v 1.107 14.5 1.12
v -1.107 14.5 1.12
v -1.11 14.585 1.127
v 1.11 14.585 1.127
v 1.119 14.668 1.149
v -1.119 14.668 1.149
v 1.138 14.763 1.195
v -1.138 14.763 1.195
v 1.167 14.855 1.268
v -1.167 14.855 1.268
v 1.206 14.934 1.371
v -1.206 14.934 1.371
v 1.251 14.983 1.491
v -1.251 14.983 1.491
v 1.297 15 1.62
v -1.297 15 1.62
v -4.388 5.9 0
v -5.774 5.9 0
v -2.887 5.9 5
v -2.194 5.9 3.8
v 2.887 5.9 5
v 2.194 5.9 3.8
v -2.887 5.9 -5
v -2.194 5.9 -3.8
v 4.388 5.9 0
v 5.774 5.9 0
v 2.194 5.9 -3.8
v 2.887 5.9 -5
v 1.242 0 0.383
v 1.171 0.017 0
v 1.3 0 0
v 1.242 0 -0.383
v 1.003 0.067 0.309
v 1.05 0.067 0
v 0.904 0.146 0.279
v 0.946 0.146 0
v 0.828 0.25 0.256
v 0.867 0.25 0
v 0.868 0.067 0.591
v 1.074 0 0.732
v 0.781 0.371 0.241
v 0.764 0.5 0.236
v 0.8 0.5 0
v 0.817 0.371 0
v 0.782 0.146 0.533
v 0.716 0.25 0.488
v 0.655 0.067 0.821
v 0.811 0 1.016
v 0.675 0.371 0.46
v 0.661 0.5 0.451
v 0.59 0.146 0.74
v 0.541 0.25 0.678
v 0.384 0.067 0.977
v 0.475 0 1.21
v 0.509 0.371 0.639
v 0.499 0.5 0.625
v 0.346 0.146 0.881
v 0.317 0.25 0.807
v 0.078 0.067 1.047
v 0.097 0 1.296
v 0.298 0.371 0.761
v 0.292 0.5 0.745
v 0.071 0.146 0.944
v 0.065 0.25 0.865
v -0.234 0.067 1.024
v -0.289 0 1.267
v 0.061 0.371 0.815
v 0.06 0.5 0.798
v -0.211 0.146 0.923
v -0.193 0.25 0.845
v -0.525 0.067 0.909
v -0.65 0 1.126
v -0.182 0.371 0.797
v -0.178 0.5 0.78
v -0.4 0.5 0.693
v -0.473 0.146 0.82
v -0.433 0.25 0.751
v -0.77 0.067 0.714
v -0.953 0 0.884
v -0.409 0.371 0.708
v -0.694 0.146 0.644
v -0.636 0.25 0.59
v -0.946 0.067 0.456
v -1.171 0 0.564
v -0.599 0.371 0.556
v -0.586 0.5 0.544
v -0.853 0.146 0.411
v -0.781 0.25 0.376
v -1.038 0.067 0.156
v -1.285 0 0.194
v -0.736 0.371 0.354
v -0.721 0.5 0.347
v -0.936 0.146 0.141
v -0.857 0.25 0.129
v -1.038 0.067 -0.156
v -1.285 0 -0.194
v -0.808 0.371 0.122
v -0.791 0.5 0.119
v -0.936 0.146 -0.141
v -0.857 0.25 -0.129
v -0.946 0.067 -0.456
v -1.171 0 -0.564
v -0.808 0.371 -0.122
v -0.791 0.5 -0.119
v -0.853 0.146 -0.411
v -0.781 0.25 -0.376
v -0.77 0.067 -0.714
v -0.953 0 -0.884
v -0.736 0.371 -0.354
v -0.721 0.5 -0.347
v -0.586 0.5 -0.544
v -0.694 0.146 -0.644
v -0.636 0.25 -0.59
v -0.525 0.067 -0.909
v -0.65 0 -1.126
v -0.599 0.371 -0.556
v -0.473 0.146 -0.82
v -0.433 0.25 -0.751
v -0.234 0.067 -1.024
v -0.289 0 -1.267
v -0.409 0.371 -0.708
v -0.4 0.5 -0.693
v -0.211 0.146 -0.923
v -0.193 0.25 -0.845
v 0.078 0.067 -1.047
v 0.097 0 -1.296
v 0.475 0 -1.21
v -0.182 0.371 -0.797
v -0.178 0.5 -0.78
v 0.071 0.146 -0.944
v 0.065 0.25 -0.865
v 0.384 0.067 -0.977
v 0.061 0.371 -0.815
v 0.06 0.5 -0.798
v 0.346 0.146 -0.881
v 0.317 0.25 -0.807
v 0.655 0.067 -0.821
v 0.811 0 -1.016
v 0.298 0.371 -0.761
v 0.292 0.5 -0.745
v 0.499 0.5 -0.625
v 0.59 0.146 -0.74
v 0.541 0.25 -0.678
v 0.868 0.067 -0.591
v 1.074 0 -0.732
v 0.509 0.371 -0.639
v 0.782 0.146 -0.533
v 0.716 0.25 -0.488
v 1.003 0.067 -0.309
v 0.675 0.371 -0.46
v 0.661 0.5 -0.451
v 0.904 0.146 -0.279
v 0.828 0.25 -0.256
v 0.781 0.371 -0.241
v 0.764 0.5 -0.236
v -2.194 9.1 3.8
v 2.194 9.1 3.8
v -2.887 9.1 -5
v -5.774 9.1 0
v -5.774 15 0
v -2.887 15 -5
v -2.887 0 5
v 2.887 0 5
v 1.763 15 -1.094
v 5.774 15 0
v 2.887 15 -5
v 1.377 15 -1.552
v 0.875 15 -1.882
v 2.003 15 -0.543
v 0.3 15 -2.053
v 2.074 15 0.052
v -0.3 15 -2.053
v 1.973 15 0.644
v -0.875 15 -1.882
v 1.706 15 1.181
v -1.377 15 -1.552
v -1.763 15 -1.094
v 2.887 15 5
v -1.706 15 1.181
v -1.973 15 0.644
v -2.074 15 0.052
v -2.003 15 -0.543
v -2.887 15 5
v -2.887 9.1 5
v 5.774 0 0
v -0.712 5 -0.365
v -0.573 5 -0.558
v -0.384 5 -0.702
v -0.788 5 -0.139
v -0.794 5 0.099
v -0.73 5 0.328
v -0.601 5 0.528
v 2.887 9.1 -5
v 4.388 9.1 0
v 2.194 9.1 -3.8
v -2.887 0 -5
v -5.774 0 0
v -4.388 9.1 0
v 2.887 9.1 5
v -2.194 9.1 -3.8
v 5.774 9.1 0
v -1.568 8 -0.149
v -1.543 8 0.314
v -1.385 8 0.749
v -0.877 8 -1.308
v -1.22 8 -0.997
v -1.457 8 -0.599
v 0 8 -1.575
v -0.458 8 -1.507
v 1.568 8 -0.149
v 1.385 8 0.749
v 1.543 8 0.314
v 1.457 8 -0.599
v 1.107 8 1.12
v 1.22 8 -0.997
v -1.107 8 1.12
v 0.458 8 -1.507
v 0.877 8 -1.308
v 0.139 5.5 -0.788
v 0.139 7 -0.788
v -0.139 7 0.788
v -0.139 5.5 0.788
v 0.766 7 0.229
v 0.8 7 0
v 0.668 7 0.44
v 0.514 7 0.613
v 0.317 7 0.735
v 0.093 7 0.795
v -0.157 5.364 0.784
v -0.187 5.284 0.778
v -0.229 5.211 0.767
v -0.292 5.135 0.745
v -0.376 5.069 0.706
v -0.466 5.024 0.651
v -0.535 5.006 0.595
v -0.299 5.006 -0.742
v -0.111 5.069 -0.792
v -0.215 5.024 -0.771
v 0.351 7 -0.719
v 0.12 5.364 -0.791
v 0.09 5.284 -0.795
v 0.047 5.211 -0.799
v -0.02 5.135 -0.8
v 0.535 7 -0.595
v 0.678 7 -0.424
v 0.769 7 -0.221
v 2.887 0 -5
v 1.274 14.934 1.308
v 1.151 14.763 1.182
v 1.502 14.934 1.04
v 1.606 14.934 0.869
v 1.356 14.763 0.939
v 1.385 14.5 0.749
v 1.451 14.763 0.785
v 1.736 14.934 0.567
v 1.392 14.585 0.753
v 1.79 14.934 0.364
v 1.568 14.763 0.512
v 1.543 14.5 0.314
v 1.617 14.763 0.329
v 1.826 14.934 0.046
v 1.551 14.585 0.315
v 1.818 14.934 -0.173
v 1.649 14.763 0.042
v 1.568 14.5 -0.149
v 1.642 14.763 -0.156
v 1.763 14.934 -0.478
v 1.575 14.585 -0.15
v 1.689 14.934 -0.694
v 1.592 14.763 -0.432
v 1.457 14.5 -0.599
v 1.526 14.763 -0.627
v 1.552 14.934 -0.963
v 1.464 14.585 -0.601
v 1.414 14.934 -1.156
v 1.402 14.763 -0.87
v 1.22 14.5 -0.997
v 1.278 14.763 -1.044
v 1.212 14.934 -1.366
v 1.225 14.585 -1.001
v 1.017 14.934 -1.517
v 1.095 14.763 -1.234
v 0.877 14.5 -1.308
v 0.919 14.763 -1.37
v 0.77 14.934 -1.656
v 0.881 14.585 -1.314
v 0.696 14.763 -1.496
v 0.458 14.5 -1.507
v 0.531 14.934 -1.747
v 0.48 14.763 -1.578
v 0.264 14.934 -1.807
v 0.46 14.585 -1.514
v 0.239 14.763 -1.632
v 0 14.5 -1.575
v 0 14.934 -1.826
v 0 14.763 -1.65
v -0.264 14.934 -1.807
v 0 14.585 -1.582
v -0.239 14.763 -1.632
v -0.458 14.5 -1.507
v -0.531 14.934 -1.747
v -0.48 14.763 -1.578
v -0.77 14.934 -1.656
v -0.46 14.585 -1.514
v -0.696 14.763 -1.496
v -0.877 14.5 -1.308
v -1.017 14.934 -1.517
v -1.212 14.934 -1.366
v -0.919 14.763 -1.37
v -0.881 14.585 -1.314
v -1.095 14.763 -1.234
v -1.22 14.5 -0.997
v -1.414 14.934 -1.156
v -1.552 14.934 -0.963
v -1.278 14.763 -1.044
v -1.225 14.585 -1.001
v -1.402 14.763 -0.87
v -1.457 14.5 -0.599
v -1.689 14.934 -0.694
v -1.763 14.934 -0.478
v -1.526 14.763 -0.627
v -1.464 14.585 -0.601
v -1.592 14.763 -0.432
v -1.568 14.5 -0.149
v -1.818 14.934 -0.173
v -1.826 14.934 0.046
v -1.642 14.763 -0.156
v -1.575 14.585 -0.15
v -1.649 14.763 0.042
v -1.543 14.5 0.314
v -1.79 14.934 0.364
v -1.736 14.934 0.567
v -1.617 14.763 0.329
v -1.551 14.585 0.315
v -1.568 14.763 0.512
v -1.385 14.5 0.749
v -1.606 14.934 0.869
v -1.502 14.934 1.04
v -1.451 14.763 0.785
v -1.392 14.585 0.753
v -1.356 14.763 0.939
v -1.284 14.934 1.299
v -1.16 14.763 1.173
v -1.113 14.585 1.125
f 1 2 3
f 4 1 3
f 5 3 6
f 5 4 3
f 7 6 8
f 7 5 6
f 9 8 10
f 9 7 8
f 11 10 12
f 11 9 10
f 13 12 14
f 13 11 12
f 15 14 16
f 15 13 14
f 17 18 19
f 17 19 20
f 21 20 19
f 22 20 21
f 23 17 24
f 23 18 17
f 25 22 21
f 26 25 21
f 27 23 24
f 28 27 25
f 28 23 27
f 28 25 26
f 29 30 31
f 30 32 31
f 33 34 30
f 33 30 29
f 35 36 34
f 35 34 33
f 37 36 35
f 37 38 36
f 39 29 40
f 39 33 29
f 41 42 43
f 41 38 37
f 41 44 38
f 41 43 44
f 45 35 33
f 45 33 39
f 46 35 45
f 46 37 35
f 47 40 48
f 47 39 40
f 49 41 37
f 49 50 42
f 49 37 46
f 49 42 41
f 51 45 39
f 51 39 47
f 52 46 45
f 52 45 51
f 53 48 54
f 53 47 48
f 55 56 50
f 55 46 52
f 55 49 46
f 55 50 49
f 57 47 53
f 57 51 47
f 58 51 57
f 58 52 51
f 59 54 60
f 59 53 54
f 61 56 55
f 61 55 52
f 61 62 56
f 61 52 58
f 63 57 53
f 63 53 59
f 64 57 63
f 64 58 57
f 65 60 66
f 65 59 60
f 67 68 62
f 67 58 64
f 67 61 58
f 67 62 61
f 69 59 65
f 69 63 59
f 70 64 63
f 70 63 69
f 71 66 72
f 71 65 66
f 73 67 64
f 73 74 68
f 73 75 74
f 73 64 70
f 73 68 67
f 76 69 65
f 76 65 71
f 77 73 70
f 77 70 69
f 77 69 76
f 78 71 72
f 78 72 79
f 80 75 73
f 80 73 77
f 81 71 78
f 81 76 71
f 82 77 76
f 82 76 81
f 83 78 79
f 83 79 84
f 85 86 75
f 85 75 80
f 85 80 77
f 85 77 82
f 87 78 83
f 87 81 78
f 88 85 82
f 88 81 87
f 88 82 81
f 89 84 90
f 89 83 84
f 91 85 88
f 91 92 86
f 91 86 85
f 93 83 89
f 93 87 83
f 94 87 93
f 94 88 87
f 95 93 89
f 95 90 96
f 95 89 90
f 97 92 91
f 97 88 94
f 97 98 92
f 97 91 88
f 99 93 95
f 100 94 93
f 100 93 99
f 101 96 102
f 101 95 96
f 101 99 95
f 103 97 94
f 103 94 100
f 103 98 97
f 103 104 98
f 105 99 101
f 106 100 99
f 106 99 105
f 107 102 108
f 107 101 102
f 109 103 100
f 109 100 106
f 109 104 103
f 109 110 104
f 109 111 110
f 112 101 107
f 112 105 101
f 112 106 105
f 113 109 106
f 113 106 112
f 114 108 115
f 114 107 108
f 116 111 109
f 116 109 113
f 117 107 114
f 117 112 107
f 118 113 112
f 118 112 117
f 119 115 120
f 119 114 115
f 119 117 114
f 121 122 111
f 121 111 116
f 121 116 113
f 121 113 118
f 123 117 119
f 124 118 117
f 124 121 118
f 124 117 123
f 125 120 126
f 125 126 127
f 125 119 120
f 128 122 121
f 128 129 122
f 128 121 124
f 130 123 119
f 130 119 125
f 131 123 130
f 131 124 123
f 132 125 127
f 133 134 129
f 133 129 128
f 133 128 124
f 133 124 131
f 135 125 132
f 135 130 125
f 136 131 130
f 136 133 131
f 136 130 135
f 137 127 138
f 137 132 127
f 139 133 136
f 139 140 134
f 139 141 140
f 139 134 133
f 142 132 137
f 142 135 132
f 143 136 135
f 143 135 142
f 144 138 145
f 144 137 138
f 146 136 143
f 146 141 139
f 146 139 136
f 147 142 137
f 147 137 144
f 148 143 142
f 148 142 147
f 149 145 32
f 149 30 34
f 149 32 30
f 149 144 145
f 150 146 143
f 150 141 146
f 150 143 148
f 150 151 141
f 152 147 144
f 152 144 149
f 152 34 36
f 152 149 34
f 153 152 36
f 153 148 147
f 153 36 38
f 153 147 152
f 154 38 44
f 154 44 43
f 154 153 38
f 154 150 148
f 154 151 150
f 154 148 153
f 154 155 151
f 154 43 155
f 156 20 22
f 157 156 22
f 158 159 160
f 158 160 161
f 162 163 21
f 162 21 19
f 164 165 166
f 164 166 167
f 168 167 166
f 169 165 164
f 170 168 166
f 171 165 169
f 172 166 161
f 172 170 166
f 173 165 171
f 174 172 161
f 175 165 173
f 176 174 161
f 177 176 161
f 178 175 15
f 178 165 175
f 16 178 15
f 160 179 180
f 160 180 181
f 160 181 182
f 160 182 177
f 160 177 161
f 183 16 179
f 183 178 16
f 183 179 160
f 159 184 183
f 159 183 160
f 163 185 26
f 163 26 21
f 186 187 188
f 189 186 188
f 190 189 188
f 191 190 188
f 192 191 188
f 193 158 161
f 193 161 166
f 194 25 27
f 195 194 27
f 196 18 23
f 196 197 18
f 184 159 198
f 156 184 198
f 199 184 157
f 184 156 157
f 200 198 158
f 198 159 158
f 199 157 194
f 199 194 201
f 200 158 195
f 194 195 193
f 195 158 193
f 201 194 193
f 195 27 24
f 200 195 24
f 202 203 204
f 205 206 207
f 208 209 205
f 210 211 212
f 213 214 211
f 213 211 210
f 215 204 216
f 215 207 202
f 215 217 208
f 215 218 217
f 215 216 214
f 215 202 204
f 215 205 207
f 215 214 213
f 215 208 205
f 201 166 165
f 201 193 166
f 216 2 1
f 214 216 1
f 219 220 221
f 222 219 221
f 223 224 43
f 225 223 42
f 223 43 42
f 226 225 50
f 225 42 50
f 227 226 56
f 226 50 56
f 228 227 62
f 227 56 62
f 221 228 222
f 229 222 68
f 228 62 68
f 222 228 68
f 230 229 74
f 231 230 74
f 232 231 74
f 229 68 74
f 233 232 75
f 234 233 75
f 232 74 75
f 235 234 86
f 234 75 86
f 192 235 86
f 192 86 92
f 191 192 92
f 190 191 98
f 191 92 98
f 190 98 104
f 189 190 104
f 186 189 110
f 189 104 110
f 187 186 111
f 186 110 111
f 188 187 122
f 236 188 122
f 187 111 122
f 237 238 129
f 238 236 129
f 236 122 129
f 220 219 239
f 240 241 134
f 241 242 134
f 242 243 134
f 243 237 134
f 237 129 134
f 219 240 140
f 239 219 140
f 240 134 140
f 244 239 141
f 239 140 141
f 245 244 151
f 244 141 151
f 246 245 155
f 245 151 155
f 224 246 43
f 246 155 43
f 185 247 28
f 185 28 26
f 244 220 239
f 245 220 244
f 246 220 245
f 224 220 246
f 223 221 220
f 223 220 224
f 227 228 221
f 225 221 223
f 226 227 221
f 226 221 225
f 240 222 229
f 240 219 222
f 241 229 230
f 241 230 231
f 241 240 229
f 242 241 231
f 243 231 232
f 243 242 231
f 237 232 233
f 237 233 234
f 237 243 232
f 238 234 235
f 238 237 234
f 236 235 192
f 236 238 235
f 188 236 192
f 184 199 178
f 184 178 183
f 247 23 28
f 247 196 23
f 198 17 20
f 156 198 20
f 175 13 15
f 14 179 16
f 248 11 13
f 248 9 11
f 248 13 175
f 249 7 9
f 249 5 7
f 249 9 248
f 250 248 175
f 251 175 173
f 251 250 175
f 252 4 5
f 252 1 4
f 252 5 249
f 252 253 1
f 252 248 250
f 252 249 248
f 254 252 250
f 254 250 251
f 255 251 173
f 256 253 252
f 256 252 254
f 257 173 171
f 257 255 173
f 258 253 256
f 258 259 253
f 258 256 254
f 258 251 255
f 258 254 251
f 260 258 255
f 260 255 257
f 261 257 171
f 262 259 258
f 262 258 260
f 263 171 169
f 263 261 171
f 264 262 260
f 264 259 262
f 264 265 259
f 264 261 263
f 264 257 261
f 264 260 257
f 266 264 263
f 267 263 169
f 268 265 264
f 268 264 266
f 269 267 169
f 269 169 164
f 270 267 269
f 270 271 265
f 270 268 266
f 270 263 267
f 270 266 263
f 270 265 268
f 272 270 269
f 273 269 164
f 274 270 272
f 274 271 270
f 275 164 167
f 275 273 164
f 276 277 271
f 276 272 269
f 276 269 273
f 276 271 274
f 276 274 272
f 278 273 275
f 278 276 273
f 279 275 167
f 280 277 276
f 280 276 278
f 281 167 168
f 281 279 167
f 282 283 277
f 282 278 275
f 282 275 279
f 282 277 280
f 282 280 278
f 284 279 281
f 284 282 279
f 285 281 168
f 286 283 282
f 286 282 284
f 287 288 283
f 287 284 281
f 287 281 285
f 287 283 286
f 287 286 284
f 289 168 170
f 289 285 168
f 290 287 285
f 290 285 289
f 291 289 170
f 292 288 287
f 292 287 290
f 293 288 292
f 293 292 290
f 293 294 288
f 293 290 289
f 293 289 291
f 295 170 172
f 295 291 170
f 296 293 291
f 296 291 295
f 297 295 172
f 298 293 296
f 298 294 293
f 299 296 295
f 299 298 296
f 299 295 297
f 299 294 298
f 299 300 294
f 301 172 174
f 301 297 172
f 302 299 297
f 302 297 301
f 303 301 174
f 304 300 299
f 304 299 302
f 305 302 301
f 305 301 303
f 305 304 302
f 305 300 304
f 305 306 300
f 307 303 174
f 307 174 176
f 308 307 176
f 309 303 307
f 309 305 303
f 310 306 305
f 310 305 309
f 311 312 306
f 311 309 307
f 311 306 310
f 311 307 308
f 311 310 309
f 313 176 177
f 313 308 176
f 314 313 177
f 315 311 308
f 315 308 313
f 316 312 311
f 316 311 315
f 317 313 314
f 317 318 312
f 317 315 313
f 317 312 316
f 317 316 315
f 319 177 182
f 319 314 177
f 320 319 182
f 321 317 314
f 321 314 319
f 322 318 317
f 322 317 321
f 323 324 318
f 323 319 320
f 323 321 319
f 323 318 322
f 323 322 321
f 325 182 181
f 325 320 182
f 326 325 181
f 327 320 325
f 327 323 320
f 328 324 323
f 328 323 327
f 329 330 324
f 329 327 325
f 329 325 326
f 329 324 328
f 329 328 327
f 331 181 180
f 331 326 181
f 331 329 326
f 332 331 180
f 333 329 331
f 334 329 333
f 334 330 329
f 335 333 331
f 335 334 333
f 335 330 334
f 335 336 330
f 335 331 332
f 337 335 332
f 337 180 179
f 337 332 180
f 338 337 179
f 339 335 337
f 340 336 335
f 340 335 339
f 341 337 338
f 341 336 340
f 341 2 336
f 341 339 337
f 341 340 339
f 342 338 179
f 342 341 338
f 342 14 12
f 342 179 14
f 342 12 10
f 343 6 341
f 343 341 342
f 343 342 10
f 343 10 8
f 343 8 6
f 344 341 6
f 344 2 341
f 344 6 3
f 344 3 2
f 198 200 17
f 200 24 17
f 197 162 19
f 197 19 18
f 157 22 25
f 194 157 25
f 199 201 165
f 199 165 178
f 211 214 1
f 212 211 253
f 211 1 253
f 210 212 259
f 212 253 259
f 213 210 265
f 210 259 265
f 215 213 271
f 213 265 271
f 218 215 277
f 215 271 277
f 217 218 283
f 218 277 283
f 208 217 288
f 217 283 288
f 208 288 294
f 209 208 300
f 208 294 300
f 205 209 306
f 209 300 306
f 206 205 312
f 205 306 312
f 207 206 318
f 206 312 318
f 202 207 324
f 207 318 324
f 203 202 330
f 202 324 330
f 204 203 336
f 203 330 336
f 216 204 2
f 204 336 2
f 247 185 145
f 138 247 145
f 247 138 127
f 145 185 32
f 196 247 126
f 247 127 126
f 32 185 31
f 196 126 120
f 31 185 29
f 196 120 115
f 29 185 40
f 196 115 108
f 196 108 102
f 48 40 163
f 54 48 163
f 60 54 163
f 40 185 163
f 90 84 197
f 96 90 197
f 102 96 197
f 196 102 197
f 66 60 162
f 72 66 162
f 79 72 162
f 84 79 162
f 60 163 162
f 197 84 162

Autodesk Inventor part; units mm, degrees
ref_plane "YZ Plane" through (0, 0, 0) normal (1, 0, 0) x (0, 1, 0)
ref_plane "XZ Plane" through (0, 0, 0) normal (0, 1, 0) x (-1, 0, 0)
sketch "Boceto1" plane through (0, 0, 0) normal (0, 1, 0) x (-1, 0, 0)
  line L0 (5.7735, 0) -> (2.8868, -5)
  line L1 (2.8868, -5) -> (-2.8868, -5)
  line L2 (-2.8868, -5) -> (-5.7735, 0)
  line L3 (-5.7735, 0) -> (-2.8868, 5)
  line L4 (-2.8868, 5) -> (2.8868, 5)
  line L5 (2.8868, 5) -> (5.7735, 0)
  circle A0 centre (0, 0) radius 5
  dimension "d0" = 10
extrude "Extrusión1" add sketch "Boceto1" along normal blind 15
sketch "Boceto2" plane through (0, 15, 0) normal (0, 1, 0) x (1, 0, 0)
  circle A0 centre (0, 0) radius 1.575
  line L0 (-1.1074, -1.12) -> (1.1074, -1.12)
  dimension "d3" = 3.15
  dimension "d6" = 1.12
extrude "Extrusión2" cut sketch "Boceto2" against normal blind 7 contours A0 L0 picked at (0.4242, -0.1216)
sketch "Boceto3" plane through (0, 0, 0) normal (0, -1, 0) x (1, 0, 0)
  circle A0 centre (0, 0) radius 0.8
  dimension "d7" = 1.6
extrude "Extrusión3" cut sketch "Boceto3" against normal blind 7
sketch "Boceto4" plane through (0, 7, 0) normal (0, -1, 0) x (1, 0, 0)
  circle A0 centre (0, 0) radius 0.8 projected
  line L0 (0.1389, -0.7878) -> (-0.1389, 0.7878)
  circle A1 centre (0, 0) radius 0.8 projected
  line L1 (0.8, 0) -> (-0.8, 0)
  line L2 (-0.0393, 0.799) -> (0.2363, -0.7643)
  line L3 (0.0894, -0.795) -> (-0.1879, 0.7776)
  point P0 (0.0894, -0.795)
  point P1 (-0.1879, 0.7776)
  dimension "d16" = 80
  dimension "d17" = 0.1
  dimension "d18" = 0.05
extrude "Extrusión4" add sketch "Boceto4" along normal blind 2 contours L0 L1 L3 A0 | A0 L3 L1 L0 | L3 L1 A0 | A0 L1 L3
ref_plane "Plano de trabajo1" through (0, 7.5, 0) normal (0, 1, 0) x (1, 0, 0)
sketch "Boceto5" plane through (0, 7.5, 0) normal (0, 1, 0) x (1, 0, 0)
  circle A0 centre (0, 0) radius 0.8 projected
  line L0 (5.7735, 0) -> (2.8868, 5) projected
  line L1 (2.8868, -5) -> (5.7735, 0) projected
  line L2 (-2.8868, -5) -> (2.8868, -5) projected
  line L3 (-5.7735, 0) -> (-2.8868, -5) projected
  line L4 (-2.8868, 5) -> (-5.7735, 0) projected
  line L5 (2.8868, 5) -> (-2.8868, 5) projected
  line L6 (-4.3879, 0) -> (-2.1939, -3.8)
  line L7 (-2.1939, -3.8) -> (2.1939, -3.8)
  line L8 (2.1939, -3.8) -> (4.3879, 0)
  line L9 (4.3879, 0) -> (2.1939, 3.8)
  line L10 (2.1939, 3.8) -> (-2.1939, 3.8)
  line L11 (-2.1939, 3.8) -> (-4.3879, 0)
  arc A1 (-0.1389, -0.7878) -> (0.1389, 0.7878) centre (0, 0) ccw projected
  circle A2 centre (0, 0) radius 6.7948
  point P0 (-0.1792, -0.7283)
  point P1 (0.0807, 0.7456)
  dimension "d13" = 1.2
extrude "Extrusión5" cut sketch "Boceto5" along normal mid plane 3.2 contours L1 L2 L3 L4 L5 L0
fillet "Empalme2" radius 0.5 3 edges at (-0.8, 0, 0) (0, 15, -1.575) (0, 15, 1.12)
fillet "Empalme3" radius 0.5 1 edges at (0, 5, 0)
properties part number "Couple"
